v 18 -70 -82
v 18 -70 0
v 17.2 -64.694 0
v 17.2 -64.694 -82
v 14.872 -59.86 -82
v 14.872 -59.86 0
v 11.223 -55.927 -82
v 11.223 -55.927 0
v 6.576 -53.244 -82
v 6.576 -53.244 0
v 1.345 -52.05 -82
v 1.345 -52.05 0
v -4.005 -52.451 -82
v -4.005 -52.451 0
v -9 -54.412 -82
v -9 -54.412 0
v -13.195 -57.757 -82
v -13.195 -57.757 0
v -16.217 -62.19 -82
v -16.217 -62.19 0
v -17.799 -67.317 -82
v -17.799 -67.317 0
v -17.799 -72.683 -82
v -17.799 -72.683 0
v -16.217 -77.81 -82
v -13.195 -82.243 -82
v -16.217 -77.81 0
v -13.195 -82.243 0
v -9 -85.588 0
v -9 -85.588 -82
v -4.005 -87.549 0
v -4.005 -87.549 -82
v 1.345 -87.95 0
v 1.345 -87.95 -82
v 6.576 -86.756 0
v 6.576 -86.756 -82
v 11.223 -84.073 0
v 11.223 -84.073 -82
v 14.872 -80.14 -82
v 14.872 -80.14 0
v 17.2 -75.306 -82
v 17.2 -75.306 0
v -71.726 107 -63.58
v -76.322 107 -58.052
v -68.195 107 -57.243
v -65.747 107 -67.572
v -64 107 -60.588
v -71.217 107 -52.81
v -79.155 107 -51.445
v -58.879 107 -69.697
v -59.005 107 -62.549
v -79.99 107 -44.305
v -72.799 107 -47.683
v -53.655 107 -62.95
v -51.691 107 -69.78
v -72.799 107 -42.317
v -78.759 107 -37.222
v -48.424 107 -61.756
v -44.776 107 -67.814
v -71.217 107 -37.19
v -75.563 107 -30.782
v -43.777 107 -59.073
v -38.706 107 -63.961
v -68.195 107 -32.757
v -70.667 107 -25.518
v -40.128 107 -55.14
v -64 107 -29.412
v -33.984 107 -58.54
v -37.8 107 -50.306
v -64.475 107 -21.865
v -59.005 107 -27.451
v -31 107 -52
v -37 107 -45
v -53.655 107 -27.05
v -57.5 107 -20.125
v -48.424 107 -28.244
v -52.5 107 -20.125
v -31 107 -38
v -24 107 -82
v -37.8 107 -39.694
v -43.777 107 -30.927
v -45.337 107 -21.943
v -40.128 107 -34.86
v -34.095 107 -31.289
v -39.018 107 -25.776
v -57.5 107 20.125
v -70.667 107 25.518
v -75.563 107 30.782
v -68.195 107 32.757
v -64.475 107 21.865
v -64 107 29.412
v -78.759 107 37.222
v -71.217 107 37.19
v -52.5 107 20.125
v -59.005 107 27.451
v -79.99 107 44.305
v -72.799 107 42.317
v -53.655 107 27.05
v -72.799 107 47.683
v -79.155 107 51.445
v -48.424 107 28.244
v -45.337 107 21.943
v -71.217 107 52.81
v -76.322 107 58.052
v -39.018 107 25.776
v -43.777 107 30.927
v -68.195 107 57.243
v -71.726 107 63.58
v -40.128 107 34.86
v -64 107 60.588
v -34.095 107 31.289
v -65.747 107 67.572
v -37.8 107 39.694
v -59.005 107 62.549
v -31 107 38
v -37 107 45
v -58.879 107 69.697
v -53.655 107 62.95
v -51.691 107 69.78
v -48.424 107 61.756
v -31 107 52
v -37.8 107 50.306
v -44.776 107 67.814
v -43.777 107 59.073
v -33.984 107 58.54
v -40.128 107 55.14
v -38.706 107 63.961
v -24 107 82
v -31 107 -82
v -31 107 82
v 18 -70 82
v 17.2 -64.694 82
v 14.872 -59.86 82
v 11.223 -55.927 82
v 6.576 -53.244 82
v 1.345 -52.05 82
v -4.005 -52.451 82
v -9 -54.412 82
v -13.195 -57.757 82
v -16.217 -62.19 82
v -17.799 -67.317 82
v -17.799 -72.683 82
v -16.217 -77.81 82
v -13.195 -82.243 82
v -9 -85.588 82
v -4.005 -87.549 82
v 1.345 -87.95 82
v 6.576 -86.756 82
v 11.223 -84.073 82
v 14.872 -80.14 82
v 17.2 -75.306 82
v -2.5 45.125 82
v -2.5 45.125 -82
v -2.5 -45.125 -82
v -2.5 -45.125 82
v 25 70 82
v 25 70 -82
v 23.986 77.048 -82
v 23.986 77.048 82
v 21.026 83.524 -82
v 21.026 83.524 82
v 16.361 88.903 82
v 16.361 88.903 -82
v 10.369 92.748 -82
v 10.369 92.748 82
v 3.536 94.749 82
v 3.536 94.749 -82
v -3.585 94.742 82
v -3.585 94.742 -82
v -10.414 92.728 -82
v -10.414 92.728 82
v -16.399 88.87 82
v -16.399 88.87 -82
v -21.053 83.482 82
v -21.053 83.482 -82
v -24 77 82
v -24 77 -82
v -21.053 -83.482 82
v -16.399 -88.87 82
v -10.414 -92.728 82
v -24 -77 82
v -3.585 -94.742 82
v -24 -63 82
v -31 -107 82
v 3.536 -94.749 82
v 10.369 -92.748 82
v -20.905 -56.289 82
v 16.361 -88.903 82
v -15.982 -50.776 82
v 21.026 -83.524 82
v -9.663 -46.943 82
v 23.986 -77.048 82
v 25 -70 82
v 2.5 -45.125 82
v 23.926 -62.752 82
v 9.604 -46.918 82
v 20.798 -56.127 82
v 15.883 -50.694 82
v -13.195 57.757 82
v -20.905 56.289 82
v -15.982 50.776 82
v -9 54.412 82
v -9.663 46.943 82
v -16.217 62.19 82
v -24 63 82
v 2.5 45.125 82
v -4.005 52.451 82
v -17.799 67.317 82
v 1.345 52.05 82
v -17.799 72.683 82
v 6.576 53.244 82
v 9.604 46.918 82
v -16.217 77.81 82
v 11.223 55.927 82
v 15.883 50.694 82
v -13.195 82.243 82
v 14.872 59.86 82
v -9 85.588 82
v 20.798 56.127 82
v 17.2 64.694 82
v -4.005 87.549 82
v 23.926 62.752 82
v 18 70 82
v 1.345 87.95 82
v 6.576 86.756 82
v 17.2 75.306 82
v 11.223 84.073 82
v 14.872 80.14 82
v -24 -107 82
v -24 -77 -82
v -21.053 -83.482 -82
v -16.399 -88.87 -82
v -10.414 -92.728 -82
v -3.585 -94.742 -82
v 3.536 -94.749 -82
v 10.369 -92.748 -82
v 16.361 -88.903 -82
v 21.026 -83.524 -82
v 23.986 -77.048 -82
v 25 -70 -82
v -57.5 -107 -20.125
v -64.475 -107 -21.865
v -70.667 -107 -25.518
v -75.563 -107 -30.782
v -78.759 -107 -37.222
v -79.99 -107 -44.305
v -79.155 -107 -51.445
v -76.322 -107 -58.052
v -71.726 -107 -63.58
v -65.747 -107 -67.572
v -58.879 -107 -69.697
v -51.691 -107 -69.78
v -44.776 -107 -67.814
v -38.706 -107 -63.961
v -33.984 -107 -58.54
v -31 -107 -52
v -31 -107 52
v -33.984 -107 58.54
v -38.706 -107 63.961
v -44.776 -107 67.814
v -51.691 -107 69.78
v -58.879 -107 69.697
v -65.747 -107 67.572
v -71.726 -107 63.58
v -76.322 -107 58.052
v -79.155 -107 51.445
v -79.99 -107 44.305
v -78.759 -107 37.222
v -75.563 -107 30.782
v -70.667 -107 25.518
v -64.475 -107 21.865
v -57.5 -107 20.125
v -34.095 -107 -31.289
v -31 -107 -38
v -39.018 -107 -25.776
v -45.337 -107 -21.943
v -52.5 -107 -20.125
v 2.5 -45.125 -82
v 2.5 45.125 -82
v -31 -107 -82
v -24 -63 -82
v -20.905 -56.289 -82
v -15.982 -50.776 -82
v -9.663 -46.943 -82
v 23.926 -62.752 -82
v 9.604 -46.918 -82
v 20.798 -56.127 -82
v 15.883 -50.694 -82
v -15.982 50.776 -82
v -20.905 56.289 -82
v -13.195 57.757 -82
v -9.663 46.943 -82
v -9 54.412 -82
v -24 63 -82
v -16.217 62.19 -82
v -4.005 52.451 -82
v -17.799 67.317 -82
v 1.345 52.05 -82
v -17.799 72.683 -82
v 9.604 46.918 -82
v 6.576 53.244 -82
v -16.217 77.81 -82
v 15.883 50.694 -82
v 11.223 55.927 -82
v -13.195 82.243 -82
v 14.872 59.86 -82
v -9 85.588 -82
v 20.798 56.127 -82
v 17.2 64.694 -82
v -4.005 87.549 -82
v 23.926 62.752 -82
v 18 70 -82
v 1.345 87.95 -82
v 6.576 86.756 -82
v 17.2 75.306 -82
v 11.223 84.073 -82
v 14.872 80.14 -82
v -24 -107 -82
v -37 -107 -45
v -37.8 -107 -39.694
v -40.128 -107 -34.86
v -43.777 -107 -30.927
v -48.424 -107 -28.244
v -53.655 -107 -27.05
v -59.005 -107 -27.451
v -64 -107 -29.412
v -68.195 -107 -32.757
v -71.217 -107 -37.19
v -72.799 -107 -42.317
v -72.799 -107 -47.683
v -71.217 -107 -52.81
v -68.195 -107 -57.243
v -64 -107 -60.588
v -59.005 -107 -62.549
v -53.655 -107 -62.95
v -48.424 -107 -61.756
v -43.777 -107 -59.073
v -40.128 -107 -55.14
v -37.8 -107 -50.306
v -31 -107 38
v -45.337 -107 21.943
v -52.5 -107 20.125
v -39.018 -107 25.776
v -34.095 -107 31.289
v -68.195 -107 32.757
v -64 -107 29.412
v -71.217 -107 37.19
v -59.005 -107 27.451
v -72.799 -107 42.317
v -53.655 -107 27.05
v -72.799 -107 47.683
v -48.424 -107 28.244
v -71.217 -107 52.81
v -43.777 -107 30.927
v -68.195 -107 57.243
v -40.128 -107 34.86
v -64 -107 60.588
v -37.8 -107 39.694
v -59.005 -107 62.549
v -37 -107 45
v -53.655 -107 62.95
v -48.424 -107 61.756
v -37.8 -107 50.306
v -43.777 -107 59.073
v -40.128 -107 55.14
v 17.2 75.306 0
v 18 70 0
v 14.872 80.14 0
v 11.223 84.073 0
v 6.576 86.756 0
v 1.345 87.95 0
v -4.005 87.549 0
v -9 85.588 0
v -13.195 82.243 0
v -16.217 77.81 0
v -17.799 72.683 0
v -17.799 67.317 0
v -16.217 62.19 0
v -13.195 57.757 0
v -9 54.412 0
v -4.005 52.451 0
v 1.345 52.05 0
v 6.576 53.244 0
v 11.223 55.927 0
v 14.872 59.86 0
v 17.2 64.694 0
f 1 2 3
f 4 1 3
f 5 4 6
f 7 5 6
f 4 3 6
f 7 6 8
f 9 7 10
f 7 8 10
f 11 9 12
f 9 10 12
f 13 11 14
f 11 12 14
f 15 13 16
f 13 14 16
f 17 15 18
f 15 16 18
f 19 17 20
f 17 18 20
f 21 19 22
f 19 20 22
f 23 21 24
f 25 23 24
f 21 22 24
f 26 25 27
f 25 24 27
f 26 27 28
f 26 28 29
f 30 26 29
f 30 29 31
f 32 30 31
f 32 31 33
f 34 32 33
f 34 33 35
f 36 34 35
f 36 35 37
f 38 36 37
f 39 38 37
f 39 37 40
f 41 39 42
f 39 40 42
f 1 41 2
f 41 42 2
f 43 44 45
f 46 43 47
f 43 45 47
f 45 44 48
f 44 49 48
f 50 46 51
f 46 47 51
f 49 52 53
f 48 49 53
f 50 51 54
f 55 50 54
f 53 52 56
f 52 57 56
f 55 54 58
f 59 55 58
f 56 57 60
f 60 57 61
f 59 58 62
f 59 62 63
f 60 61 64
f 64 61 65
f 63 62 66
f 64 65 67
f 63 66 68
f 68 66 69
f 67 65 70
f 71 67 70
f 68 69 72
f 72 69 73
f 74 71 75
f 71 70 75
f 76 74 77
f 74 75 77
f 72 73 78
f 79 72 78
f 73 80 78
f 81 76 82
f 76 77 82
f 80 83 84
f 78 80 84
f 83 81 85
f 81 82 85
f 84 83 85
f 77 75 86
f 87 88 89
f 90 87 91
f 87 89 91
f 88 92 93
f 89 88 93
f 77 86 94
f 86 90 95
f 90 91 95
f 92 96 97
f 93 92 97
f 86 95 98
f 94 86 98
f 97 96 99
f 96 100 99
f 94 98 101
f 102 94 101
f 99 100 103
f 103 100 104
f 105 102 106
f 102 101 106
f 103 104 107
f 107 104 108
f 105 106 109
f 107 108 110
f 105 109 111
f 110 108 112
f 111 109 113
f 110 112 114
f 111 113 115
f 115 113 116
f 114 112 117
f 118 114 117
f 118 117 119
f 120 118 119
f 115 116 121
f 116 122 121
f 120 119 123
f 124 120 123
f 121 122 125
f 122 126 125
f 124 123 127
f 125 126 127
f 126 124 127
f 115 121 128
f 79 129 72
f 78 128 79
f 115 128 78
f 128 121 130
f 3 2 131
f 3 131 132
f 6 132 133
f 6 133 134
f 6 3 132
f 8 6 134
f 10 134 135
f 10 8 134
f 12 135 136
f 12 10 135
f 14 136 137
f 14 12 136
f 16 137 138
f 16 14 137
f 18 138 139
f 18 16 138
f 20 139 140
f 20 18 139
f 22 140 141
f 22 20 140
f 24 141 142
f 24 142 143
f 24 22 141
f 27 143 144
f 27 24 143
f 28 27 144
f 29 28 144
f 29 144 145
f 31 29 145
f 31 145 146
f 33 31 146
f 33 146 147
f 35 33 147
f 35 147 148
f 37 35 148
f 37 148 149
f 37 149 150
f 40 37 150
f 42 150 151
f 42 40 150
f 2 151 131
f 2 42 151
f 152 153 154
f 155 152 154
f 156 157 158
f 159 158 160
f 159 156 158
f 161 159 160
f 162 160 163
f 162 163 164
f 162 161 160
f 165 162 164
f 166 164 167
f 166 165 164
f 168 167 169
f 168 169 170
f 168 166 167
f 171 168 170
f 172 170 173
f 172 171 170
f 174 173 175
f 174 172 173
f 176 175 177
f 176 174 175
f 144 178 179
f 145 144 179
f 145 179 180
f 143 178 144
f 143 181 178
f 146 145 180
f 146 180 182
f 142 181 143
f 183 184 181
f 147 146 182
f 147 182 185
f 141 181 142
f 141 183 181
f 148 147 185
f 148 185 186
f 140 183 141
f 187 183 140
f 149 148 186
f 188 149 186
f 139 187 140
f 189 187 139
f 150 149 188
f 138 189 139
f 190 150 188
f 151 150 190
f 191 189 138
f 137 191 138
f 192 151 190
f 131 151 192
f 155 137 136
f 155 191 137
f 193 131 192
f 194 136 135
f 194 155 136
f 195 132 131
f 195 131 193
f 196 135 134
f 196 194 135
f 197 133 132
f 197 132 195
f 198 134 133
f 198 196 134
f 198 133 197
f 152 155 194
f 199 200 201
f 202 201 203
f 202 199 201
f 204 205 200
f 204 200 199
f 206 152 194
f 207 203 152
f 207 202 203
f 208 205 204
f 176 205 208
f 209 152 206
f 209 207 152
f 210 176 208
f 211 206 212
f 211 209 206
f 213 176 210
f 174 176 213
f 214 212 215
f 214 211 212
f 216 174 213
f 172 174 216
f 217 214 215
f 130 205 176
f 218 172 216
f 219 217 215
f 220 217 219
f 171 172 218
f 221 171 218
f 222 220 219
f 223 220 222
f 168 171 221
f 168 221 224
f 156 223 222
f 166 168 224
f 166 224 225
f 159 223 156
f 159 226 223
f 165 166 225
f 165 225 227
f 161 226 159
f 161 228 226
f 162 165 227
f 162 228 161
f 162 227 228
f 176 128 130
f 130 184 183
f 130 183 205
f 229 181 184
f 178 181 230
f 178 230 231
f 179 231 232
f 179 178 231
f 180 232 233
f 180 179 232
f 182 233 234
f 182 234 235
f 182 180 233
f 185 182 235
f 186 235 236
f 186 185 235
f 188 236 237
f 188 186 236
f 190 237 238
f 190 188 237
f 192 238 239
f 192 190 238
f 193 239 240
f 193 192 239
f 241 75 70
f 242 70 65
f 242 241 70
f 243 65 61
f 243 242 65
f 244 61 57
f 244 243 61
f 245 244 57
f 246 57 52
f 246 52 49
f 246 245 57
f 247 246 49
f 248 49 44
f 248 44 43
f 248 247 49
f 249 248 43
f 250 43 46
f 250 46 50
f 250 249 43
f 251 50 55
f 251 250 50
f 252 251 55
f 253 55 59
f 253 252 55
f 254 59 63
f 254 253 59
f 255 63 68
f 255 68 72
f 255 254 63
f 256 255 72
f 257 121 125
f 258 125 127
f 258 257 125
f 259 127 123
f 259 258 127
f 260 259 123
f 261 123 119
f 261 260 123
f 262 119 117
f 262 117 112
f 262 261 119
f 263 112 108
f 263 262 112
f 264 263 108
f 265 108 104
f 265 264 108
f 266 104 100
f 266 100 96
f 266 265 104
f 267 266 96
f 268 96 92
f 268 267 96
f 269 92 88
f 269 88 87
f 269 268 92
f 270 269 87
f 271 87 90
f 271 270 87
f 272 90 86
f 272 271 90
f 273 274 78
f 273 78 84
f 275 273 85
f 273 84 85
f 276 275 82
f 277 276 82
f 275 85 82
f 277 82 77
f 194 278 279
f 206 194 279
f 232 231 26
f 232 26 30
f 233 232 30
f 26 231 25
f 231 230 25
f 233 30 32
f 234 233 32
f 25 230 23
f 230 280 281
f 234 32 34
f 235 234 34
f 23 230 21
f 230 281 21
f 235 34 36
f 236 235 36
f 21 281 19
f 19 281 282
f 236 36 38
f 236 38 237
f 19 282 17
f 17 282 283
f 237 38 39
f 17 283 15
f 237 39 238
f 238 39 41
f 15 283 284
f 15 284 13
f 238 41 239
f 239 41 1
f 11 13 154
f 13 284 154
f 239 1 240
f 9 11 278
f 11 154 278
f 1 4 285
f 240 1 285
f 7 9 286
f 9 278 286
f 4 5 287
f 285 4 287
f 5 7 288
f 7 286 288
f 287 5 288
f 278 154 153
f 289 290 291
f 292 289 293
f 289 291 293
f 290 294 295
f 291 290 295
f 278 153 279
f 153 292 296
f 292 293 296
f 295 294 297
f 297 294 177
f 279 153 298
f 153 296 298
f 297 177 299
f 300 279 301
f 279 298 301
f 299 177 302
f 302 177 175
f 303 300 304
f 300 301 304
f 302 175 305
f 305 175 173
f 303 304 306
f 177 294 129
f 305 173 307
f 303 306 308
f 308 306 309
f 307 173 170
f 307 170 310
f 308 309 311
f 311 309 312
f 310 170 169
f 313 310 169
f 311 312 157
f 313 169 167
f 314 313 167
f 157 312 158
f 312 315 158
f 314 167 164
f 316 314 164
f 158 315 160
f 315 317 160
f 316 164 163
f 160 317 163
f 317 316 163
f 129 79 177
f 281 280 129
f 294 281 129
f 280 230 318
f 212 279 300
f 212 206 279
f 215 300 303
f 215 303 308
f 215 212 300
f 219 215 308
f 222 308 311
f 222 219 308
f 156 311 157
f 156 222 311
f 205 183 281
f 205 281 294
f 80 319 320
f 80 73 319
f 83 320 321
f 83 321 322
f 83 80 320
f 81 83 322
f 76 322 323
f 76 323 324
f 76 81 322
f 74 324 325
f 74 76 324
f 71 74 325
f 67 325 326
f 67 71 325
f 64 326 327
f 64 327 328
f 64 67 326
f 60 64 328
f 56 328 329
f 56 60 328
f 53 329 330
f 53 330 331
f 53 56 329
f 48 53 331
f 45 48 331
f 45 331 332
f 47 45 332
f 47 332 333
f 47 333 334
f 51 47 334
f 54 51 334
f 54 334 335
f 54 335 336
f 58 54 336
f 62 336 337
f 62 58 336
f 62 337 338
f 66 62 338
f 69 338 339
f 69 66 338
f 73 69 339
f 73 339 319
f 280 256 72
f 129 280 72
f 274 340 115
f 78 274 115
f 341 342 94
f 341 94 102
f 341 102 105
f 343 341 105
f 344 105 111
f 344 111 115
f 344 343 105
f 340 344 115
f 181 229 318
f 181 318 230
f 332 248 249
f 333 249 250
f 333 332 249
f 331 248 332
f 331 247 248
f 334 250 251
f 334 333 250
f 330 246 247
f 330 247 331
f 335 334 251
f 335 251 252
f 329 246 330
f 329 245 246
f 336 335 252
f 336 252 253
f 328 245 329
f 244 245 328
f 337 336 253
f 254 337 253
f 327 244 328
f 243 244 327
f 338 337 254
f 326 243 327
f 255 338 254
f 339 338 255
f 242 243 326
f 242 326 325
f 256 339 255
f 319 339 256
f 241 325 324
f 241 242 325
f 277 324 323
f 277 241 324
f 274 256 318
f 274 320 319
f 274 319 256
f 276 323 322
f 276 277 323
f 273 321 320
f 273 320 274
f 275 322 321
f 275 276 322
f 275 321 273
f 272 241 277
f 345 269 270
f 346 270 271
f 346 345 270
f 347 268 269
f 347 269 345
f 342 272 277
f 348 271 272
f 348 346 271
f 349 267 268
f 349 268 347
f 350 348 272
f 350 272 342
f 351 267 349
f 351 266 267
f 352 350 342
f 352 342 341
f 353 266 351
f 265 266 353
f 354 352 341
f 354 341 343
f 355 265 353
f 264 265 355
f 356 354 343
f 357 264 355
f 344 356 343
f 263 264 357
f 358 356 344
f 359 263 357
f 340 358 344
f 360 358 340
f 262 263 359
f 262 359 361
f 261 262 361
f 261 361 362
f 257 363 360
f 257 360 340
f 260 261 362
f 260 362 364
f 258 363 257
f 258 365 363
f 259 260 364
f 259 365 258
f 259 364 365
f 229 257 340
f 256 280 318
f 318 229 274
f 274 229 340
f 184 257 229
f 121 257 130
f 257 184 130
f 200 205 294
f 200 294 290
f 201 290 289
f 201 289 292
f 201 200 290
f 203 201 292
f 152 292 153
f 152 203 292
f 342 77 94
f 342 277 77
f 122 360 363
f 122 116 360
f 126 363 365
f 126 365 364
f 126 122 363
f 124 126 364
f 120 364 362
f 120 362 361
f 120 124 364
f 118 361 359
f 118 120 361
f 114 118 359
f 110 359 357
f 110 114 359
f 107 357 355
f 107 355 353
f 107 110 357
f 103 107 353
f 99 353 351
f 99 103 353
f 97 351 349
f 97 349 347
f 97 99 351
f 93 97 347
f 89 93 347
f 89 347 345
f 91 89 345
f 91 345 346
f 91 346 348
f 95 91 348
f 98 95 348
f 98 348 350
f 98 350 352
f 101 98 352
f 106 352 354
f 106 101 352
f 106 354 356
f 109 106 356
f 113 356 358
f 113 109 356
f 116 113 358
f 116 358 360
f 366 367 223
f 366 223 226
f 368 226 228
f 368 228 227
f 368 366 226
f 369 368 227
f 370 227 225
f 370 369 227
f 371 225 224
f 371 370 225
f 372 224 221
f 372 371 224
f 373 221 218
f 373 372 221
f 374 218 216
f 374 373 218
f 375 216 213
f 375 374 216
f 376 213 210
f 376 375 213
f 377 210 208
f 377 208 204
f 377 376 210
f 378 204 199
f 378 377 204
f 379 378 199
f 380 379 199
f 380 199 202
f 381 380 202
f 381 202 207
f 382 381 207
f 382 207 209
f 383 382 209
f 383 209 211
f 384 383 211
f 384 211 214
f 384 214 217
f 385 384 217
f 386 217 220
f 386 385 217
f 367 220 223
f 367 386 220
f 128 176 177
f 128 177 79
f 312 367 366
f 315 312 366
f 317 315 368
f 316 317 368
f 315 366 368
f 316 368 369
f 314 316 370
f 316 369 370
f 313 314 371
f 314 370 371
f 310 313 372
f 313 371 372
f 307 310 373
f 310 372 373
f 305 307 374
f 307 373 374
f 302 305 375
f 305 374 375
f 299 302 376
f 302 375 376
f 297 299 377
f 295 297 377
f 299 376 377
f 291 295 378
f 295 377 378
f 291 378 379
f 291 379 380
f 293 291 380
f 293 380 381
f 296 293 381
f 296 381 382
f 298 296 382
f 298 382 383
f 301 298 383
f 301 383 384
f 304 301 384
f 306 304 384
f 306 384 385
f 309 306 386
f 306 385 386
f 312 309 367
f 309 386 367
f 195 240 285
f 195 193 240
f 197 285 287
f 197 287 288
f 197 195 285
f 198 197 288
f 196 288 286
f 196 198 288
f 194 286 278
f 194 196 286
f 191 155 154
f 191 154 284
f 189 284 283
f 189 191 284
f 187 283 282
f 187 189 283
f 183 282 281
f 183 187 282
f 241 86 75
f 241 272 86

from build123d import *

# Parameters (mm, degrees)
F2_W          = 7
F2_H          = 214
F3_DEPTH      = 82
F3_DEPTH_BACK = 82
F0_R          = 18
F4_DEPTH      = 107
F4_DEPTH_BACK = 107
F1_R          = 18
F5_DEPTH      = 82
F5_DEPTH_BACK = 82


with BuildPart() as f3:
    # F2 (on Top) → F3 (new body, two sides)
    with BuildSketch(Plane.XY) as f3_sk:
        with Locations((-27.5, 0)):
            Rectangle(F2_W, F2_H)
    extrude(amount=F3_DEPTH)
    extrude(f3_sk.sketch, amount=-F3_DEPTH_BACK)

    # F0 (on Front) → F4 (join, two sides)
    with BuildSketch(Plane.XZ) as f4_sk:
        with BuildLine():
            ThreePointArc((-52.5, 20.125314), (-36.459504, 28.22949), (-30, 45))
            ThreePointArc((-30, 45), (-71.77051, 63.540496), (-57.5, 20.125314))
            Line((-57.5, 20.125314), (-52.5, 20.125314))
        make_face()
        with Locations((-55, 45)):
            Circle(F0_R, mode=Mode.SUBTRACT)
        with BuildLine():
            Line((-52.5, -20.125314), (-57.5, -20.125314))
            ThreePointArc((-57.5, -20.125314), (-71.77051, -63.540496), (-30, -45))
            ThreePointArc((-30, -45), (-36.459504, -28.22949), (-52.5, -20.125314))
        make_face()
        with Locations((-55, -45)):
            Circle(F0_R, mode=Mode.SUBTRACT)
        with BuildLine():
            Line((-52.5, 20.125314), (-57.5, 20.125314))
            ThreePointArc((-57.5, 20.125314), (-55, 20), (-52.5, 20.125314))
        make_face()
        with BuildLine():
            ThreePointArc((-52.5, 20.125314), (-55, 20), (-57.5, 20.125314))
            Line((-57.5, 20.125314), (-57.5, -20.125314))
            ThreePointArc((-57.5, -20.125314), (-55, -20), (-52.5, -20.125314))
            Line((-52.5, -20.125314), (-52.5, 20.125314))
        make_face()
        with BuildLine():
            ThreePointArc((-52.5, -20.125314), (-55, -20), (-57.5, -20.125314))
            Line((-57.5, -20.125314), (-52.5, -20.125314))
        make_face()
    extrude(amount=F4_DEPTH)
    extrude(f4_sk.sketch, amount=-F4_DEPTH_BACK)

    # F1 (on Top) → F5 (join, two sides)
    with BuildSketch(Plane.XY) as f5_sk:
        with BuildLine():
            ThreePointArc((2.5, 45.125314), (18.540496, 53.22949), (25, 70))
            ThreePointArc((25, 70), (-16.77051, 88.540496), (-2.5, 45.125314))
            Line((-2.5, 45.125314), (2.5, 45.125314))
        make_face()
        with Locations((0, 70)):
            Circle(F1_R, mode=Mode.SUBTRACT)
        with BuildLine():
            ThreePointArc((2.5, 45.125314), (0, 45), (-2.5, 45.125314))
            Line((-2.5, 45.125314), (-2.5, -45.125314))
            ThreePointArc((-2.5, -45.125314), (0, -45), (2.5, -45.125314))
            Line((2.5, -45.125314), (2.5, 45.125314))
        make_face()
        with BuildLine():
            Line((2.5, 45.125314), (-2.5, 45.125314))
            ThreePointArc((-2.5, 45.125314), (0, 45), (2.5, 45.125314))
        make_face()
        with BuildLine():
            Line((2.5, -45.125314), (-2.5, -45.125314))
            ThreePointArc((-2.5, -45.125314), (-16.77051, -88.540496), (25, -70))
            ThreePointArc((25, -70), (18.540496, -53.22949), (2.5, -45.125314))
        make_face()
        with Locations((0, -70)):
            Circle(F1_R, mode=Mode.SUBTRACT)
        with BuildLine():
            ThreePointArc((2.5, -45.125314), (0, -45), (-2.5, -45.125314))
            Line((-2.5, -45.125314), (2.5, -45.125314))
        make_face()
    extrude(amount=F5_DEPTH)
    extrude(f5_sk.sketch, amount=-F5_DEPTH_BACK)


solid = f3.part
